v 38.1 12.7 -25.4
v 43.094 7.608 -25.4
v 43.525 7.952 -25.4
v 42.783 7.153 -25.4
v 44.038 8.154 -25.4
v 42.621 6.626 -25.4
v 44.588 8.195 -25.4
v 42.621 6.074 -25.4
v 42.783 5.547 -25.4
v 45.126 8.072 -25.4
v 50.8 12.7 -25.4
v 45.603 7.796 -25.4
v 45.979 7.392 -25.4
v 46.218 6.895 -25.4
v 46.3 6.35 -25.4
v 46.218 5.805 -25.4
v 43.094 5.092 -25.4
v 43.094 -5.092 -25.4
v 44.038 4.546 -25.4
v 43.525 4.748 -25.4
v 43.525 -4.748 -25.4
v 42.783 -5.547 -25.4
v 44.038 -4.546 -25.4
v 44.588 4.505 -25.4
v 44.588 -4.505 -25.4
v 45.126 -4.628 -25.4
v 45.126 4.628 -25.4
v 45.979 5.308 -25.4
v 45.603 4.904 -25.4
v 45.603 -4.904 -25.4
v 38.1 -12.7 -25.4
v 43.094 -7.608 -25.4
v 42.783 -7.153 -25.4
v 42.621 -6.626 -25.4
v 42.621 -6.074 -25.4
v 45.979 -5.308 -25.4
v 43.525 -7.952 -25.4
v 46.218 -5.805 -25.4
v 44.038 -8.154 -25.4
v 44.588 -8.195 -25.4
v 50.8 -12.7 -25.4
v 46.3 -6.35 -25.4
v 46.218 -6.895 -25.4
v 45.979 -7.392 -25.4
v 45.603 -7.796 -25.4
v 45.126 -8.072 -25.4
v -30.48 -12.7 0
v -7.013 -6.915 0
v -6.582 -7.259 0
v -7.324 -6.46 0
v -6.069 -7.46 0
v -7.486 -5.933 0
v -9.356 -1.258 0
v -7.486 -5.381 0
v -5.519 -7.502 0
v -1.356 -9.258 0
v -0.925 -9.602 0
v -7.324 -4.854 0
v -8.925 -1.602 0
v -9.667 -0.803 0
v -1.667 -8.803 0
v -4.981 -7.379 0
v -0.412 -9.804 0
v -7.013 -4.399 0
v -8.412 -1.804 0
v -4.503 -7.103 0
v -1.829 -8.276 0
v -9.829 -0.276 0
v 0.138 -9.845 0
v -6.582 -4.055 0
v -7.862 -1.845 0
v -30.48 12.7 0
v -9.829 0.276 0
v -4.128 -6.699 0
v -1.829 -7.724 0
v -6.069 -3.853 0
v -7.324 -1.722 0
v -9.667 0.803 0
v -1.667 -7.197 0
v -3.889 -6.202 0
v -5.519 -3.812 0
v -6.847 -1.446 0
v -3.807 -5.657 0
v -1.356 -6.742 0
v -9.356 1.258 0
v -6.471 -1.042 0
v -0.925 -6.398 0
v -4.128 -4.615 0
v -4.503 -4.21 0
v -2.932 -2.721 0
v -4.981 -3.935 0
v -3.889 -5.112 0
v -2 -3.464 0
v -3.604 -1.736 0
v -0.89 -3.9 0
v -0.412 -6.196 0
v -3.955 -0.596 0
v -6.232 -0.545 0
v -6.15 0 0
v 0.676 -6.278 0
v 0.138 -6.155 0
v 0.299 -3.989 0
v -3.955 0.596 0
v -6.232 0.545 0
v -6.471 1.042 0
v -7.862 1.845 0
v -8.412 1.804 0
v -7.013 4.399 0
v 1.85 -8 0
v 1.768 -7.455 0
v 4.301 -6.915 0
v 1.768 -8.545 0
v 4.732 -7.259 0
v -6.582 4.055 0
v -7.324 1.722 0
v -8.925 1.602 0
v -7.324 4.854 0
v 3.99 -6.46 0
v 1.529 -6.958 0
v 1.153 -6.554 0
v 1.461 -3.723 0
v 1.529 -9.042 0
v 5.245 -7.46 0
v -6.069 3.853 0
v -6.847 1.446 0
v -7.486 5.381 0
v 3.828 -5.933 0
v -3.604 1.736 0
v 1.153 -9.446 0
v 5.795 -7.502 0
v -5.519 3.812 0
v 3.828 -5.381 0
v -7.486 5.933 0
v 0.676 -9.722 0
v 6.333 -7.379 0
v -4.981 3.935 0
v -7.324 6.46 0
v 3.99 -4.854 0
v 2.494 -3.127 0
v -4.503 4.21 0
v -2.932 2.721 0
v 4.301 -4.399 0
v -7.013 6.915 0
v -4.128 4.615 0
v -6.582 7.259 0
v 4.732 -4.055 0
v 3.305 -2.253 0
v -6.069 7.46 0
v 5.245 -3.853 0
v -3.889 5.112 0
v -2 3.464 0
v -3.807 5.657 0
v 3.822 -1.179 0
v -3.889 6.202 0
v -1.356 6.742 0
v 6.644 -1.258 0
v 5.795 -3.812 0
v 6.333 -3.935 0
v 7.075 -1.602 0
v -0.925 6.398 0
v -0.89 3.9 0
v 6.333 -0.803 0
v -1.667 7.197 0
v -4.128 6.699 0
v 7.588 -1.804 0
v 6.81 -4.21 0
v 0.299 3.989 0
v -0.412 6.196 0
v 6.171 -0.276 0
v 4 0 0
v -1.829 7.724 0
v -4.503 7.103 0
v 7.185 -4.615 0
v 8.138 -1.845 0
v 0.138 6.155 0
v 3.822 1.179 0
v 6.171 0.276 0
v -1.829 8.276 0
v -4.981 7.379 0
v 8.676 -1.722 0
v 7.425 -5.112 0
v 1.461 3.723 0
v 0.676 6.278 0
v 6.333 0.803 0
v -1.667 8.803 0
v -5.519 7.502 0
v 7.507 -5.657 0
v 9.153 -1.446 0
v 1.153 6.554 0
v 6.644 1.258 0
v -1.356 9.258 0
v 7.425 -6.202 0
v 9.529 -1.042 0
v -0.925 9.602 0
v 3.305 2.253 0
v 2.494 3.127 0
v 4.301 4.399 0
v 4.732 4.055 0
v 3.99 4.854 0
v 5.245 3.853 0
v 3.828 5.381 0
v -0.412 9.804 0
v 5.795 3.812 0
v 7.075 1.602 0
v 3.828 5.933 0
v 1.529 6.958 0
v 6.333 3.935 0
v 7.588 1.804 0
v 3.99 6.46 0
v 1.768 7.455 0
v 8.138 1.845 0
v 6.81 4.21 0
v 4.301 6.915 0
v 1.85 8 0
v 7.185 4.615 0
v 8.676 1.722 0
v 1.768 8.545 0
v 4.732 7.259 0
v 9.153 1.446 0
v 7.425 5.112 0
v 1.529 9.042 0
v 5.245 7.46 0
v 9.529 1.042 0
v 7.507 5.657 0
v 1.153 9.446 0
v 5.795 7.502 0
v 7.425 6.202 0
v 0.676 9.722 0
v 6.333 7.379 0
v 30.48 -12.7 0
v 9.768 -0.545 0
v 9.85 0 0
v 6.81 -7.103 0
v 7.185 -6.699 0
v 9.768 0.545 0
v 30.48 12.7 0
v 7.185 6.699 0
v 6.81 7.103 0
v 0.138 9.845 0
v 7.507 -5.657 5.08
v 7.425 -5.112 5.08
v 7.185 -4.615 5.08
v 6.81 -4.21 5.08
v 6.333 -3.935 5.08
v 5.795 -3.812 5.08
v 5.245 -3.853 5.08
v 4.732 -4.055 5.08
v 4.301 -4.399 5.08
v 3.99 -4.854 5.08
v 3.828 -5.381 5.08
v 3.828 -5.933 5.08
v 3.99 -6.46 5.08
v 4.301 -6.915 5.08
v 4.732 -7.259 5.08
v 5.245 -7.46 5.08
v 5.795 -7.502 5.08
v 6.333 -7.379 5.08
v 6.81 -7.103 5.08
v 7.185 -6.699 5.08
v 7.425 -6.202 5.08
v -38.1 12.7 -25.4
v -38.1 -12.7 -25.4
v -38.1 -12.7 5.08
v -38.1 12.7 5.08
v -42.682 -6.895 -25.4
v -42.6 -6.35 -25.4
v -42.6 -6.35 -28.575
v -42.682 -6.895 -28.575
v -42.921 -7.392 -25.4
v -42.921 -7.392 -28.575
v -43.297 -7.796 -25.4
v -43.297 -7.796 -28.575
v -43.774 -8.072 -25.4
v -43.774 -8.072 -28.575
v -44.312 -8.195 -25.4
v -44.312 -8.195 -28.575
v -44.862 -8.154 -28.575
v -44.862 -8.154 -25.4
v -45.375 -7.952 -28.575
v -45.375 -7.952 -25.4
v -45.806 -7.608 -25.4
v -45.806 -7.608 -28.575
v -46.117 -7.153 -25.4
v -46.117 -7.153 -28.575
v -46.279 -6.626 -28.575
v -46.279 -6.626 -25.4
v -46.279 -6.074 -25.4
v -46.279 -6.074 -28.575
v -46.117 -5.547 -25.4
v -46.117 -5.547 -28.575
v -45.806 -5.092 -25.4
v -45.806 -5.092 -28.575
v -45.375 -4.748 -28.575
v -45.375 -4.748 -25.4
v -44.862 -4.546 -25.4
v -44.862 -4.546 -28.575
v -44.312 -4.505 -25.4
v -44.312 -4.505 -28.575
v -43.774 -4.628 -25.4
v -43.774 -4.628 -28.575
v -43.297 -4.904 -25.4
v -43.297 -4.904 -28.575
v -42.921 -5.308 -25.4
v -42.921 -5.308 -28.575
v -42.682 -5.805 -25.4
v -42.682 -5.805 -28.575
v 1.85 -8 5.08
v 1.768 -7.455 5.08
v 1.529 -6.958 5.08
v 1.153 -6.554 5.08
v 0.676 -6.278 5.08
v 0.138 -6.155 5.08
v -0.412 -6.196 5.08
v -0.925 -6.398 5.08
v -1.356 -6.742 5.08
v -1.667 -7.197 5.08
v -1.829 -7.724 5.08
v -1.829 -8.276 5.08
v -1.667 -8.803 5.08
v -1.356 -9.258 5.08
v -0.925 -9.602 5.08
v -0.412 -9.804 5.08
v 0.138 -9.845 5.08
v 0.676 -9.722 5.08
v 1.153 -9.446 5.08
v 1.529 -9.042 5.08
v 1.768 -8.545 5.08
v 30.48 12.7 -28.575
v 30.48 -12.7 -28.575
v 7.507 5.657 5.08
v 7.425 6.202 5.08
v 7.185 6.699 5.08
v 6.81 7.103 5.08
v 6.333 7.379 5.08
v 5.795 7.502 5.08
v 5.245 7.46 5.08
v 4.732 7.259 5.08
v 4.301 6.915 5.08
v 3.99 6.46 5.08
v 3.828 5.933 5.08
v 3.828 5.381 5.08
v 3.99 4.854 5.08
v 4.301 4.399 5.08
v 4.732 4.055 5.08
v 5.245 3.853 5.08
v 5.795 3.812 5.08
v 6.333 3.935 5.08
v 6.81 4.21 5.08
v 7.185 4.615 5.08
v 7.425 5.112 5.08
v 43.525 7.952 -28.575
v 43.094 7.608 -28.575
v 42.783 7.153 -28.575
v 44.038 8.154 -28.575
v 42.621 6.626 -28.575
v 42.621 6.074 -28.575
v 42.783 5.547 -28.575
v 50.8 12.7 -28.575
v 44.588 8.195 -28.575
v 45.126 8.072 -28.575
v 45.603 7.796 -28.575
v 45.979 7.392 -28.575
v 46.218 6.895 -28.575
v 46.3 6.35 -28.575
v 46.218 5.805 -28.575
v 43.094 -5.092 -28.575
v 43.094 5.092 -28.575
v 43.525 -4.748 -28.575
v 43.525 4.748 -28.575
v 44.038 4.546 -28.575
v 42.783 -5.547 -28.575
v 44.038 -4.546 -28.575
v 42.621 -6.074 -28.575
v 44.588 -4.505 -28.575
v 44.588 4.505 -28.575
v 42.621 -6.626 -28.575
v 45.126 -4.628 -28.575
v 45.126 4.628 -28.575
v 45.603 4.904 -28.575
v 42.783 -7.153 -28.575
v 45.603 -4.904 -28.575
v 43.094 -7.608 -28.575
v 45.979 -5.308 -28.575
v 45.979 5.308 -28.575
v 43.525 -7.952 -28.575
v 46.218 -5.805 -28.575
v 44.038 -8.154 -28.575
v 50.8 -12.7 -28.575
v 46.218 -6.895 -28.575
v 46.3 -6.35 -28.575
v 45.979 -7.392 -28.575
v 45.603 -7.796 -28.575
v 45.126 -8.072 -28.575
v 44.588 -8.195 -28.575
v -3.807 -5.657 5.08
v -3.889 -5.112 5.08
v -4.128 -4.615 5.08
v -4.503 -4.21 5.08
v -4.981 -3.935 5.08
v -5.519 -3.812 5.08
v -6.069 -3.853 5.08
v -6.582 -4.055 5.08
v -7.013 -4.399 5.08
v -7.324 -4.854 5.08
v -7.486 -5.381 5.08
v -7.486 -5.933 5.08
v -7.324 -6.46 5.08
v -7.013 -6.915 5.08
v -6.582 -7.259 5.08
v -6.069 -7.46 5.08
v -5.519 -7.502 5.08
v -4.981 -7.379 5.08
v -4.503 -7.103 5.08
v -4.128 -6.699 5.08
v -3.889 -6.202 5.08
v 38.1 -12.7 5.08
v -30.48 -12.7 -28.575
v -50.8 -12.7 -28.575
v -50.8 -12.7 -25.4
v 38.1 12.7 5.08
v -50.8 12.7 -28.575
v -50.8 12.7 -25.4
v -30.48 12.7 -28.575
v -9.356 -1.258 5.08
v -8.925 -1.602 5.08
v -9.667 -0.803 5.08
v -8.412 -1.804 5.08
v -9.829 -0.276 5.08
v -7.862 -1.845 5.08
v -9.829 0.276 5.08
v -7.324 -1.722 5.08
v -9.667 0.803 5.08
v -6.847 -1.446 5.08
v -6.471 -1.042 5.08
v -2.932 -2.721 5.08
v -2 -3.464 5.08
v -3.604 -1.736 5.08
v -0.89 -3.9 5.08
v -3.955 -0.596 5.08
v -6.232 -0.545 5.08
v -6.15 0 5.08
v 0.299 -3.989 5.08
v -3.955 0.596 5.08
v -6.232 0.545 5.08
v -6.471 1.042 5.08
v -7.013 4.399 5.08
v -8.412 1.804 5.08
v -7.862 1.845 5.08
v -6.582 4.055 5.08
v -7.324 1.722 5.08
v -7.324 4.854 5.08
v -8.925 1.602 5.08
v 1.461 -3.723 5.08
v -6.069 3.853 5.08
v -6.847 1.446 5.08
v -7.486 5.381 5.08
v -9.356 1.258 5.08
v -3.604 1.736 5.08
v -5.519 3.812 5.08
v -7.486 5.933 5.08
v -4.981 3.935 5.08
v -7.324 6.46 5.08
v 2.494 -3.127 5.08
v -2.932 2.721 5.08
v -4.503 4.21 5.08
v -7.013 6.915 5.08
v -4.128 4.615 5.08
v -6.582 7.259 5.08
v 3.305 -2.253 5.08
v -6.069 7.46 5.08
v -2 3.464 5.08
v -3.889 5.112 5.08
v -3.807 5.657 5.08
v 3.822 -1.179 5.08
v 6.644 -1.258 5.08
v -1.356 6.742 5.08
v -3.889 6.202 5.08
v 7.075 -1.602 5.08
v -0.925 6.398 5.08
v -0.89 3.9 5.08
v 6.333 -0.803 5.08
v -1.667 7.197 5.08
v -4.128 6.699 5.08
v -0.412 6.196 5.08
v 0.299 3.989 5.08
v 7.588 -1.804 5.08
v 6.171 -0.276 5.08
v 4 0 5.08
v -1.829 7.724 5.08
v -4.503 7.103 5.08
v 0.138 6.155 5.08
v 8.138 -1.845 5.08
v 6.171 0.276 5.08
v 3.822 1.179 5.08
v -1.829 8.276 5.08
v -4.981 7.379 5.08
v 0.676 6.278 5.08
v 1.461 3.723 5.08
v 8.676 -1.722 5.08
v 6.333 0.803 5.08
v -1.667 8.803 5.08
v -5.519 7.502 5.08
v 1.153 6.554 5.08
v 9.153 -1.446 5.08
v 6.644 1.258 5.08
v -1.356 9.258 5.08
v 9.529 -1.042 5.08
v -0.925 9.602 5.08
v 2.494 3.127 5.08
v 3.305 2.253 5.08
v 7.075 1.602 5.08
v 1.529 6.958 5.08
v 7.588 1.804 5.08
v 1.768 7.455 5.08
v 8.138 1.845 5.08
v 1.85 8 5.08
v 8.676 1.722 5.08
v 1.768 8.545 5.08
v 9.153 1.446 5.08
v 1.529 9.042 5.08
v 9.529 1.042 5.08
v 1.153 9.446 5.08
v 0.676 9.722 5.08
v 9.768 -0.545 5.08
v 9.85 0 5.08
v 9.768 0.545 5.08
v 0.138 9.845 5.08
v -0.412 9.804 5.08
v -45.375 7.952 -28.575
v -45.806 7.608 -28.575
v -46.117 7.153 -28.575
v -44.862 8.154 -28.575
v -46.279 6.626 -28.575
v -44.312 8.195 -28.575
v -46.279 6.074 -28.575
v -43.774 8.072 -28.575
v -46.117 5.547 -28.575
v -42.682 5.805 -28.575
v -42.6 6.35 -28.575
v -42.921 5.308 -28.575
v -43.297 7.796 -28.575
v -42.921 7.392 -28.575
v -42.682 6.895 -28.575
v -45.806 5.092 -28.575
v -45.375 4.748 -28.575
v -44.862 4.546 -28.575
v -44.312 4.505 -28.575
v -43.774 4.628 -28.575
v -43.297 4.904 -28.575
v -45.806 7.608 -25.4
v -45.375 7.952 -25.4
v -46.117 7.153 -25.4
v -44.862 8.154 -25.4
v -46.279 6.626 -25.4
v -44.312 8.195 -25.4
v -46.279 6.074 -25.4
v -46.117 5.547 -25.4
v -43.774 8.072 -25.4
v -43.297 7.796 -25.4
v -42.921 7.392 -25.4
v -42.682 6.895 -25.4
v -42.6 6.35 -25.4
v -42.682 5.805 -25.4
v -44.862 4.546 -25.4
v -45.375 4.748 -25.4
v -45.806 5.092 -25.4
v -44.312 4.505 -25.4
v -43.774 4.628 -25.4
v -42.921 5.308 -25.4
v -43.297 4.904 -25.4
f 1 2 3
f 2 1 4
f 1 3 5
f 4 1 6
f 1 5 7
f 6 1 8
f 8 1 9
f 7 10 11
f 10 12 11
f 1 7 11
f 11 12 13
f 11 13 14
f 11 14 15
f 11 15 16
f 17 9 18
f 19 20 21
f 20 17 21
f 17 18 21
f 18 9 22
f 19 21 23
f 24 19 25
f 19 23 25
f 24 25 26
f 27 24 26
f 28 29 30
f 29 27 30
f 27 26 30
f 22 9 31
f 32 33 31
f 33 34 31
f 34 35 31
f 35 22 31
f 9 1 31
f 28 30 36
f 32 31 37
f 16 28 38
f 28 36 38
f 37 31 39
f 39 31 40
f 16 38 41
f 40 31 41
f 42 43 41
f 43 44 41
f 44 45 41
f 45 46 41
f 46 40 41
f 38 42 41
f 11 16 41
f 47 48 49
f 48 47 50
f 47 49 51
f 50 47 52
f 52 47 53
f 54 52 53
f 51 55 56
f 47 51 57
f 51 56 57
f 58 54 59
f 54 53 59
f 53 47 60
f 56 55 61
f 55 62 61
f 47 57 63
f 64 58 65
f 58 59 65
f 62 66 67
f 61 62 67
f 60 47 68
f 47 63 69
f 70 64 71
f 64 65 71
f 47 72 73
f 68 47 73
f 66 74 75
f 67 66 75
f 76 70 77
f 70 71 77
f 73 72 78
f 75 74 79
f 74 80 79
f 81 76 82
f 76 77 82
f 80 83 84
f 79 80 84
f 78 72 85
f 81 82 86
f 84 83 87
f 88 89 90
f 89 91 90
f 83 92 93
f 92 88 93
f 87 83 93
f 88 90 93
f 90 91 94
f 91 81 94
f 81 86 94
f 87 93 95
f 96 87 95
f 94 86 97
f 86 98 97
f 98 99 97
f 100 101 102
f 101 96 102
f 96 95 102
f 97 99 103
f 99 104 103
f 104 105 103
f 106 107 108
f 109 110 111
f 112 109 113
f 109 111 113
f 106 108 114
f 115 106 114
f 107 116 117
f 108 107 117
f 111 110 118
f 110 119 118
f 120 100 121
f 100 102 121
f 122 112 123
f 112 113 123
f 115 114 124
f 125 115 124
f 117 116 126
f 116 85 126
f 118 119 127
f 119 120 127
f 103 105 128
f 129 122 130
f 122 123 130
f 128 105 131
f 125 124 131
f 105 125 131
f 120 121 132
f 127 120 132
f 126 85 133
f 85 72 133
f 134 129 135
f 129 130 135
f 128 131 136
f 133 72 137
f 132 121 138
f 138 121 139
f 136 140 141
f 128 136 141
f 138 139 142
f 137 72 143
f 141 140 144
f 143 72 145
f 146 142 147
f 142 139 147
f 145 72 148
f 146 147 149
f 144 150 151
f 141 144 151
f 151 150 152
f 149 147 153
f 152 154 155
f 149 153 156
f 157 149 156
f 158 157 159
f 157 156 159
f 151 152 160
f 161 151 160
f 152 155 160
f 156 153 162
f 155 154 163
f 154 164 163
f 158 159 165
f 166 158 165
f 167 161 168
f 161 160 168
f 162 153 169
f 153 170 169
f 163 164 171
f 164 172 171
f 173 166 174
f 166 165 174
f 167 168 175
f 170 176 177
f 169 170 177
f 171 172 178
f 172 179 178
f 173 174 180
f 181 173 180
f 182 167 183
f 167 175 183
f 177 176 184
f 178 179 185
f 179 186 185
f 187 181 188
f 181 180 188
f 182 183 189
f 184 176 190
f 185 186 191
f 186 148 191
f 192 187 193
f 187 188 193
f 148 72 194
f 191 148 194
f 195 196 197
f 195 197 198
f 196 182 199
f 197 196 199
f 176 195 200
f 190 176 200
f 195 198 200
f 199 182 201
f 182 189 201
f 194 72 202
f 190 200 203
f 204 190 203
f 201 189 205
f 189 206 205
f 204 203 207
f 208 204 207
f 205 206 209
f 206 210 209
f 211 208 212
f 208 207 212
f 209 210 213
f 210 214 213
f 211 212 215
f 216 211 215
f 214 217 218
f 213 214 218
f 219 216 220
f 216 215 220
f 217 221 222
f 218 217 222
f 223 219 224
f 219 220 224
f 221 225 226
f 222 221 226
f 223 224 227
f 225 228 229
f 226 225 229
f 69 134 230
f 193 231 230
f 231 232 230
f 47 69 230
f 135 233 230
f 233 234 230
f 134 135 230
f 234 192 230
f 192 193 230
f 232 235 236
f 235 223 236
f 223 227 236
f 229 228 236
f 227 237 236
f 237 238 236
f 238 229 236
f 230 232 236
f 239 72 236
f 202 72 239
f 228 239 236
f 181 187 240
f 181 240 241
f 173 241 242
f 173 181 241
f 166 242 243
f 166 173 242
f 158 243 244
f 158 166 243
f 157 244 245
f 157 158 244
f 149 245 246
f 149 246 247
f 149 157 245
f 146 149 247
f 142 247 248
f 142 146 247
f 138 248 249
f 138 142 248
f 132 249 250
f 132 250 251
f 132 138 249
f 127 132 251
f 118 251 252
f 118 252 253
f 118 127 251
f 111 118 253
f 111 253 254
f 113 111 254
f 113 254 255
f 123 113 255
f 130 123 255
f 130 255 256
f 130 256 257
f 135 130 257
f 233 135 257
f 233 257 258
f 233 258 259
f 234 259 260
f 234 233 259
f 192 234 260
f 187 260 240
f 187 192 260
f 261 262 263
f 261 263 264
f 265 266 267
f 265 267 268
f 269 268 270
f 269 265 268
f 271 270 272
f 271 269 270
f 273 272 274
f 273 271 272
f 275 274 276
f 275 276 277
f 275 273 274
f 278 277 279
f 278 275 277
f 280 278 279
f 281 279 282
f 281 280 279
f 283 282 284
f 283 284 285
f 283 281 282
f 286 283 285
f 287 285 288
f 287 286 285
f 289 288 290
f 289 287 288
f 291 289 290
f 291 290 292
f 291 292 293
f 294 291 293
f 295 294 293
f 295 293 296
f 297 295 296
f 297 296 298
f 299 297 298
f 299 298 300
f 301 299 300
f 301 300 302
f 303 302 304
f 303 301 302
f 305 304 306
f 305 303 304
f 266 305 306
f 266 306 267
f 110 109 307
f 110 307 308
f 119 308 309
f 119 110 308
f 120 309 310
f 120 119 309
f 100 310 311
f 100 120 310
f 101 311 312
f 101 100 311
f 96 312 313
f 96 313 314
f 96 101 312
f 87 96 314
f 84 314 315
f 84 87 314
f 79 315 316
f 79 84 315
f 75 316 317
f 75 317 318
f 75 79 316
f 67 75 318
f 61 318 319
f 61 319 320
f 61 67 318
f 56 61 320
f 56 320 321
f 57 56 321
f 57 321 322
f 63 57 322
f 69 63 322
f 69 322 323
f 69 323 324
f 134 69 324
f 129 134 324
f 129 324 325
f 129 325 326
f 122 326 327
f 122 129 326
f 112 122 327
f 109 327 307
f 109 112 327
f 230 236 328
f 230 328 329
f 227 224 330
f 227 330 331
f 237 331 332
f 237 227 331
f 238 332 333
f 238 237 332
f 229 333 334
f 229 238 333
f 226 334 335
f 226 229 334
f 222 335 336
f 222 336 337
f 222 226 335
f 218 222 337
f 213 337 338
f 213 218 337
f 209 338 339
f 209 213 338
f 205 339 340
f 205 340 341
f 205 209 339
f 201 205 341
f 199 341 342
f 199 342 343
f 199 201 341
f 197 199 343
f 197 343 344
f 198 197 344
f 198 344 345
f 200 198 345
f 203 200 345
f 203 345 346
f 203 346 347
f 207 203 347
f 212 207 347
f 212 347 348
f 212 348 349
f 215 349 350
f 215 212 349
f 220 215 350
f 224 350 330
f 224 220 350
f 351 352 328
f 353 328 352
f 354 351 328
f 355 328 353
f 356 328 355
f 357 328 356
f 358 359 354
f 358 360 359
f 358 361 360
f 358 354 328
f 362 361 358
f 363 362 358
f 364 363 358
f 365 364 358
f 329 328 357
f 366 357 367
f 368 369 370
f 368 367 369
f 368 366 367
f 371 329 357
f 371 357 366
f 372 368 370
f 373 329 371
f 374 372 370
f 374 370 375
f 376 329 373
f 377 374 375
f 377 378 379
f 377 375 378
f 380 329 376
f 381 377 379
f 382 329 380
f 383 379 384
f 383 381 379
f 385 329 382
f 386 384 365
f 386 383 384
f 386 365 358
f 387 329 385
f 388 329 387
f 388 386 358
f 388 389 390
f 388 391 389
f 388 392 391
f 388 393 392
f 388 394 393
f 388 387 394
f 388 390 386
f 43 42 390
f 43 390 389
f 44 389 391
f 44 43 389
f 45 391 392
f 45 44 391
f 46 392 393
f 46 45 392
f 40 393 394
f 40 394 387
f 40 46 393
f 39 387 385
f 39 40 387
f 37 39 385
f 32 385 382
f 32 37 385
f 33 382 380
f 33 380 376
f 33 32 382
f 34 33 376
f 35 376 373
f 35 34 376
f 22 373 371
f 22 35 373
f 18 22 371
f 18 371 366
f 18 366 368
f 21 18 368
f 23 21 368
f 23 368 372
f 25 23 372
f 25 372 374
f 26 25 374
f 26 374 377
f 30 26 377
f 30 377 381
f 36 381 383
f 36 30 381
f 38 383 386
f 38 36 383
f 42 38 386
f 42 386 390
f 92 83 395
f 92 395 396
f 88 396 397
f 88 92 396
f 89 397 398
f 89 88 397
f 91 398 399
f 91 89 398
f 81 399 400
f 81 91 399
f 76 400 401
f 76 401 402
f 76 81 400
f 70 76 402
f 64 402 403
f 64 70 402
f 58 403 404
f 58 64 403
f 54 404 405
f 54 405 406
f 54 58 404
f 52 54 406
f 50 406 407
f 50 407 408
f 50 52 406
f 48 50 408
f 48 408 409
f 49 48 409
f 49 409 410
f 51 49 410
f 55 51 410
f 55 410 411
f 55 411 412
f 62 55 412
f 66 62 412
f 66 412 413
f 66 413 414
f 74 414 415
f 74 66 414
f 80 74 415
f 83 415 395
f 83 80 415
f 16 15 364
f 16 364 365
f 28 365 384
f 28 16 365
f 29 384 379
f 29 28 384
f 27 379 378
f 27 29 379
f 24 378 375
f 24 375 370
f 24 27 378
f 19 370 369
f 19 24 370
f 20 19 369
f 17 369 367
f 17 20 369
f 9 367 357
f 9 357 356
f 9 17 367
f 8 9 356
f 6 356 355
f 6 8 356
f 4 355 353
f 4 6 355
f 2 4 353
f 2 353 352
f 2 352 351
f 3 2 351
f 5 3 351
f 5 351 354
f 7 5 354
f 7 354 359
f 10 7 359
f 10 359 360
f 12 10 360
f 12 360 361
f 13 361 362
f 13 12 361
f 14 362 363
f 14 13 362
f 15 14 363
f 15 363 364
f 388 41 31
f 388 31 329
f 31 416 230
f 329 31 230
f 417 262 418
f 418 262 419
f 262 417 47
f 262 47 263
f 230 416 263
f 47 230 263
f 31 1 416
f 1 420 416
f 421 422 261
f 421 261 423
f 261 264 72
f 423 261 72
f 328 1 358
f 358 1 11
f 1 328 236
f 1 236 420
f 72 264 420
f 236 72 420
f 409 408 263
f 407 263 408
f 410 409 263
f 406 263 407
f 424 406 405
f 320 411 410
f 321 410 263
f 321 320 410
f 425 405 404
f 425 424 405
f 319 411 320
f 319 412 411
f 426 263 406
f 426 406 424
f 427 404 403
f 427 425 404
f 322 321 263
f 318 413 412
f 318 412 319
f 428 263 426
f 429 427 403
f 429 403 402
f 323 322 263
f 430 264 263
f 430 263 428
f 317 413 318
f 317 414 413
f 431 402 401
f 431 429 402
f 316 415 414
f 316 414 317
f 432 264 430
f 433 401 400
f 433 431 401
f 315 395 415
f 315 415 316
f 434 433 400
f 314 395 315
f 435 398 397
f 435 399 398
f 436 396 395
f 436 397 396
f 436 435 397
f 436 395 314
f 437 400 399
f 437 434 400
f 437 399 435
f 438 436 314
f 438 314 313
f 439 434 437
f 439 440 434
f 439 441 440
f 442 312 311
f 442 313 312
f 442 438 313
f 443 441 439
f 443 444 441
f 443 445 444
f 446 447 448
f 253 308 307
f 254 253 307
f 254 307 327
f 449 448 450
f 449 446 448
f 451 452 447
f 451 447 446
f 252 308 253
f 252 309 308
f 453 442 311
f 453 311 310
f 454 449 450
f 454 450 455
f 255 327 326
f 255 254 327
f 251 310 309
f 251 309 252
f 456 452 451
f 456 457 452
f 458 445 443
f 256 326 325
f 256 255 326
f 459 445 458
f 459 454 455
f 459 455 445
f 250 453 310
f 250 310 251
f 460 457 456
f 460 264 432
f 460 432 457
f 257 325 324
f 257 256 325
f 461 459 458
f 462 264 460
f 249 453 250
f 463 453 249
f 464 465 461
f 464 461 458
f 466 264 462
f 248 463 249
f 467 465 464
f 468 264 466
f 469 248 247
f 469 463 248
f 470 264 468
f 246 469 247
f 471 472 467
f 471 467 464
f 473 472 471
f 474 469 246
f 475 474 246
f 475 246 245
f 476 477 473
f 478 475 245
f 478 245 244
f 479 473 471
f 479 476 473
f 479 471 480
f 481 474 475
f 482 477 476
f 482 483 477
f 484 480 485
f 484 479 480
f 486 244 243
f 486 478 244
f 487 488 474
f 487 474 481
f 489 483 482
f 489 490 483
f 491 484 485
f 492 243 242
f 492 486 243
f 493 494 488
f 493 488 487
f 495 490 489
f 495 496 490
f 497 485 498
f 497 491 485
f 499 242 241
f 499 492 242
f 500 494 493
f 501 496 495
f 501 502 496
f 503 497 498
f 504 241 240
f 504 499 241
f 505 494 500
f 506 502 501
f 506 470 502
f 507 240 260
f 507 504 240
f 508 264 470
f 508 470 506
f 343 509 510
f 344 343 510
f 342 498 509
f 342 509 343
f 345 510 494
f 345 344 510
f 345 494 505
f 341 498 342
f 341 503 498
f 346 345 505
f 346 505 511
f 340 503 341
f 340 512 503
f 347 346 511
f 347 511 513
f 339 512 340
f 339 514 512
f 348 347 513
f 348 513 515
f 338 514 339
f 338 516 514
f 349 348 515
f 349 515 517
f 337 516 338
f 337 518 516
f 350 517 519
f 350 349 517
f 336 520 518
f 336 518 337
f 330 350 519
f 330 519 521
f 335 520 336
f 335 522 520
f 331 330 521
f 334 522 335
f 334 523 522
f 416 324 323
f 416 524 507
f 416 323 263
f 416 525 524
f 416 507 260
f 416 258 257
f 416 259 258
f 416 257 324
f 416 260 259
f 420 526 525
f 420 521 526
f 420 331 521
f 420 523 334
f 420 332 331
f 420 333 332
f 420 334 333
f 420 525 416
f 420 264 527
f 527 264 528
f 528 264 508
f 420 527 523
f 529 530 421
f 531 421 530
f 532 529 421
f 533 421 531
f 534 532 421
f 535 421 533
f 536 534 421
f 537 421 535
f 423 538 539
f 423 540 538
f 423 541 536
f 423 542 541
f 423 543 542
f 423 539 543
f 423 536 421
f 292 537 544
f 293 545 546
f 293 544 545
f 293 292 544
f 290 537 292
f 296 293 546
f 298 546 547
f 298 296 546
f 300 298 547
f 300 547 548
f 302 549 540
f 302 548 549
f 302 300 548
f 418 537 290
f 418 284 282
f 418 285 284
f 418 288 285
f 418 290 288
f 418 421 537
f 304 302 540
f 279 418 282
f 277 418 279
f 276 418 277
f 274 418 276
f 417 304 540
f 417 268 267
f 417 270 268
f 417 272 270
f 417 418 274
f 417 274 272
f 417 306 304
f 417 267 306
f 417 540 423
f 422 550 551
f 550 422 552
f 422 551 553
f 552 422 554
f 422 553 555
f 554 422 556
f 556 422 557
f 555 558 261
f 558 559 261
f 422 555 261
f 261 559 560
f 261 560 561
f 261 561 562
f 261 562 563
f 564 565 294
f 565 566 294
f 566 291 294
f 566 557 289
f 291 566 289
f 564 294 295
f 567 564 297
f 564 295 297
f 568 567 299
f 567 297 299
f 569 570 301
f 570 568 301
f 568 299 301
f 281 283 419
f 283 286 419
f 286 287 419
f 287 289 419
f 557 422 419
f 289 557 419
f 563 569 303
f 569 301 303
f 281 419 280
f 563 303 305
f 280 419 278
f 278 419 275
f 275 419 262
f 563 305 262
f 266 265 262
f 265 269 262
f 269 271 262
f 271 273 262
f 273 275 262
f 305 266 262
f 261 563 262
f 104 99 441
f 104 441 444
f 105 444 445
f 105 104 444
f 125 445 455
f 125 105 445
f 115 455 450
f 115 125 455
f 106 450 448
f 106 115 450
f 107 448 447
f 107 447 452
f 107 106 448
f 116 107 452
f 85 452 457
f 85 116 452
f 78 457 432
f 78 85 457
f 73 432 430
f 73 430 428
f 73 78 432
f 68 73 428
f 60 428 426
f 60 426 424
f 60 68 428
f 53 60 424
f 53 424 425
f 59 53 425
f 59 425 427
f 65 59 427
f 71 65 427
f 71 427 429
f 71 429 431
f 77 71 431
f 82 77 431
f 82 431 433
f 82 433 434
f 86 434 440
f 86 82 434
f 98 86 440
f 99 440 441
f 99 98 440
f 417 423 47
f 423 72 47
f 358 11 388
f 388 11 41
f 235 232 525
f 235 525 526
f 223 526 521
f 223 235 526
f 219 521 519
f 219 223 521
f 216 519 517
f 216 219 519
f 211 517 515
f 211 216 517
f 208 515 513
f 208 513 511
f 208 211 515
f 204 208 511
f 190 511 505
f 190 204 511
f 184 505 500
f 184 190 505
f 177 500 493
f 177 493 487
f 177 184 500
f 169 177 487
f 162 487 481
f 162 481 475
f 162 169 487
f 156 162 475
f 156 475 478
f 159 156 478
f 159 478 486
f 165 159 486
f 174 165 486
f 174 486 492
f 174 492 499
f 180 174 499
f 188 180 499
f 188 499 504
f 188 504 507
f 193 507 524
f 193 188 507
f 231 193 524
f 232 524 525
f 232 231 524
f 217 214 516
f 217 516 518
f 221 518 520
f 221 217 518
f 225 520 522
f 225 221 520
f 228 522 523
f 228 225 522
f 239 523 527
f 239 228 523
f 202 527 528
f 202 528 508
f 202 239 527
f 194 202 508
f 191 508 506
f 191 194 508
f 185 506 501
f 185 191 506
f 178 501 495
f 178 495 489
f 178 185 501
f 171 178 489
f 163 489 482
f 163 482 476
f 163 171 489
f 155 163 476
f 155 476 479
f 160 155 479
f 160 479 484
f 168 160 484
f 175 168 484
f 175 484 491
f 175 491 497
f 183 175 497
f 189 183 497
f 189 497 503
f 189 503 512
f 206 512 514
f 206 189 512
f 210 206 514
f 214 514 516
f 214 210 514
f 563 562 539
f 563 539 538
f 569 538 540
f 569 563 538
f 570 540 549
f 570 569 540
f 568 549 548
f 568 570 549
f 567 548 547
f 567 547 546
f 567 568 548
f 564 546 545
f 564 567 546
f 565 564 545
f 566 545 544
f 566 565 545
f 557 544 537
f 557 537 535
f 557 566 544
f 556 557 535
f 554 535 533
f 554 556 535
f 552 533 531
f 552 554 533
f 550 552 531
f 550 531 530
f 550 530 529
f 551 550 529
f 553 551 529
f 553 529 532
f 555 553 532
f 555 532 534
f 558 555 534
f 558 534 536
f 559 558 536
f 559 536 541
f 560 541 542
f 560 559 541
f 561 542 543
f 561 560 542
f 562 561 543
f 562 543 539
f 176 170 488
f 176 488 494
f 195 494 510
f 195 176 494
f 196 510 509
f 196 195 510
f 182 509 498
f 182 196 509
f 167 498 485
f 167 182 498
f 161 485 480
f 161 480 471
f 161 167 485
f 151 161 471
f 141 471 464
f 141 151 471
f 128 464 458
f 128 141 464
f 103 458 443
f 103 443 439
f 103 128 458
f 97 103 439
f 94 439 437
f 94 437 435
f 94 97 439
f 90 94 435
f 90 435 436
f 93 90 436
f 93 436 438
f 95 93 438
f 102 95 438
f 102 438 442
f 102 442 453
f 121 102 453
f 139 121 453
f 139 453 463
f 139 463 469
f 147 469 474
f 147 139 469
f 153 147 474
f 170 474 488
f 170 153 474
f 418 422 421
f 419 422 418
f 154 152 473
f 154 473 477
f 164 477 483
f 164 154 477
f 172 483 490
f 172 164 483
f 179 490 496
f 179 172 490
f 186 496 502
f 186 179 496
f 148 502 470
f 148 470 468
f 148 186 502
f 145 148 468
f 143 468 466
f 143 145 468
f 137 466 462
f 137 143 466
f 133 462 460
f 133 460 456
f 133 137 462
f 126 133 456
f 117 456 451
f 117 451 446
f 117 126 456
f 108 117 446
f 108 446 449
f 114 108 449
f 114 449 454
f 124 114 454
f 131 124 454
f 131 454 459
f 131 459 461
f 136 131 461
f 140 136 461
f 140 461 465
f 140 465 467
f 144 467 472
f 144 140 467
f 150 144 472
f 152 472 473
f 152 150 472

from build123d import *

# Parameters (mm, degrees)
F0_W     = 76.2
F0_H     = 25.4
F0_R     = 1.85
F0_R_2   = 4
F1_DEPTH = 5.08
F2_W     = 7.62
F2_H     = 25.4
F3_DEPTH = 25.4
F4_W     = 12.7
F4_H     = 25.4
F4_R     = 1.85
F4_W_2   = 7.62
F4_W_3   = 20.32
F5_DEPTH = 3.175


with BuildPart() as f1:
    # F0 (on Top) → F1 (new body)
    with BuildSketch(Plane.XY):
        Rectangle(F0_W, F0_H)
        with Locations((-5.656854, -5.656854)):
            Circle(F0_R, mode=Mode.SUBTRACT)
        with Locations((-8, 0)):
            Circle(F0_R, mode=Mode.SUBTRACT)
        with Locations((0, -8)):
            Circle(F0_R, mode=Mode.SUBTRACT)
        with Locations((5.656854, -5.656854)):
            Circle(F0_R, mode=Mode.SUBTRACT)
        Circle(F0_R_2, mode=Mode.SUBTRACT)
        with Locations((8, 0)):
            Circle(F0_R, mode=Mode.SUBTRACT)
        with Locations((-5.656854, 5.656854)):
            Circle(F0_R, mode=Mode.SUBTRACT)
        with Locations((5.656854, 5.656854)):
            Circle(F0_R, mode=Mode.SUBTRACT)
        with Locations((0, 8)):
            Circle(F0_R, mode=Mode.SUBTRACT)
    extrude(amount=F1_DEPTH)

    # F2 (on face) → F3 (join)
    with BuildSketch(Plane(origin=(0, 0, 0), x_dir=(1, 0, 0), z_dir=(0, 0, -1))):
        with Locations((34.29, 0)):
            Rectangle(F2_W, F2_H)
        with Locations((-34.29, 0)):
            Rectangle(F2_W, F2_H)
    extrude(amount=F3_DEPTH)

    # F4 (on face) → F5 (join)
    with BuildSketch(Plane(origin=(0, 0, -25.4), x_dir=(1, 0, 0), z_dir=(0, 0, -1))):
        with Locations((-44.45, 0)):
            Rectangle(F4_W, F4_H)
        with Locations((-44.45, -6.35)):
            Circle(F4_R, mode=Mode.SUBTRACT)
        with Locations((-44.45, 6.35)):
            Circle(F4_R, mode=Mode.SUBTRACT)
        with Locations((-34.29, 0)):
            Rectangle(F4_W_2, F4_H)
        with Locations((40.64, 0)):
            Rectangle(F4_W_3, F4_H)
        with Locations((44.45, -6.35)):
            Circle(F4_R, mode=Mode.SUBTRACT)
        with Locations((44.45, 6.35)):
            Circle(F4_R, mode=Mode.SUBTRACT)
    extrude(amount=F5_DEPTH)


solid = f1.part
